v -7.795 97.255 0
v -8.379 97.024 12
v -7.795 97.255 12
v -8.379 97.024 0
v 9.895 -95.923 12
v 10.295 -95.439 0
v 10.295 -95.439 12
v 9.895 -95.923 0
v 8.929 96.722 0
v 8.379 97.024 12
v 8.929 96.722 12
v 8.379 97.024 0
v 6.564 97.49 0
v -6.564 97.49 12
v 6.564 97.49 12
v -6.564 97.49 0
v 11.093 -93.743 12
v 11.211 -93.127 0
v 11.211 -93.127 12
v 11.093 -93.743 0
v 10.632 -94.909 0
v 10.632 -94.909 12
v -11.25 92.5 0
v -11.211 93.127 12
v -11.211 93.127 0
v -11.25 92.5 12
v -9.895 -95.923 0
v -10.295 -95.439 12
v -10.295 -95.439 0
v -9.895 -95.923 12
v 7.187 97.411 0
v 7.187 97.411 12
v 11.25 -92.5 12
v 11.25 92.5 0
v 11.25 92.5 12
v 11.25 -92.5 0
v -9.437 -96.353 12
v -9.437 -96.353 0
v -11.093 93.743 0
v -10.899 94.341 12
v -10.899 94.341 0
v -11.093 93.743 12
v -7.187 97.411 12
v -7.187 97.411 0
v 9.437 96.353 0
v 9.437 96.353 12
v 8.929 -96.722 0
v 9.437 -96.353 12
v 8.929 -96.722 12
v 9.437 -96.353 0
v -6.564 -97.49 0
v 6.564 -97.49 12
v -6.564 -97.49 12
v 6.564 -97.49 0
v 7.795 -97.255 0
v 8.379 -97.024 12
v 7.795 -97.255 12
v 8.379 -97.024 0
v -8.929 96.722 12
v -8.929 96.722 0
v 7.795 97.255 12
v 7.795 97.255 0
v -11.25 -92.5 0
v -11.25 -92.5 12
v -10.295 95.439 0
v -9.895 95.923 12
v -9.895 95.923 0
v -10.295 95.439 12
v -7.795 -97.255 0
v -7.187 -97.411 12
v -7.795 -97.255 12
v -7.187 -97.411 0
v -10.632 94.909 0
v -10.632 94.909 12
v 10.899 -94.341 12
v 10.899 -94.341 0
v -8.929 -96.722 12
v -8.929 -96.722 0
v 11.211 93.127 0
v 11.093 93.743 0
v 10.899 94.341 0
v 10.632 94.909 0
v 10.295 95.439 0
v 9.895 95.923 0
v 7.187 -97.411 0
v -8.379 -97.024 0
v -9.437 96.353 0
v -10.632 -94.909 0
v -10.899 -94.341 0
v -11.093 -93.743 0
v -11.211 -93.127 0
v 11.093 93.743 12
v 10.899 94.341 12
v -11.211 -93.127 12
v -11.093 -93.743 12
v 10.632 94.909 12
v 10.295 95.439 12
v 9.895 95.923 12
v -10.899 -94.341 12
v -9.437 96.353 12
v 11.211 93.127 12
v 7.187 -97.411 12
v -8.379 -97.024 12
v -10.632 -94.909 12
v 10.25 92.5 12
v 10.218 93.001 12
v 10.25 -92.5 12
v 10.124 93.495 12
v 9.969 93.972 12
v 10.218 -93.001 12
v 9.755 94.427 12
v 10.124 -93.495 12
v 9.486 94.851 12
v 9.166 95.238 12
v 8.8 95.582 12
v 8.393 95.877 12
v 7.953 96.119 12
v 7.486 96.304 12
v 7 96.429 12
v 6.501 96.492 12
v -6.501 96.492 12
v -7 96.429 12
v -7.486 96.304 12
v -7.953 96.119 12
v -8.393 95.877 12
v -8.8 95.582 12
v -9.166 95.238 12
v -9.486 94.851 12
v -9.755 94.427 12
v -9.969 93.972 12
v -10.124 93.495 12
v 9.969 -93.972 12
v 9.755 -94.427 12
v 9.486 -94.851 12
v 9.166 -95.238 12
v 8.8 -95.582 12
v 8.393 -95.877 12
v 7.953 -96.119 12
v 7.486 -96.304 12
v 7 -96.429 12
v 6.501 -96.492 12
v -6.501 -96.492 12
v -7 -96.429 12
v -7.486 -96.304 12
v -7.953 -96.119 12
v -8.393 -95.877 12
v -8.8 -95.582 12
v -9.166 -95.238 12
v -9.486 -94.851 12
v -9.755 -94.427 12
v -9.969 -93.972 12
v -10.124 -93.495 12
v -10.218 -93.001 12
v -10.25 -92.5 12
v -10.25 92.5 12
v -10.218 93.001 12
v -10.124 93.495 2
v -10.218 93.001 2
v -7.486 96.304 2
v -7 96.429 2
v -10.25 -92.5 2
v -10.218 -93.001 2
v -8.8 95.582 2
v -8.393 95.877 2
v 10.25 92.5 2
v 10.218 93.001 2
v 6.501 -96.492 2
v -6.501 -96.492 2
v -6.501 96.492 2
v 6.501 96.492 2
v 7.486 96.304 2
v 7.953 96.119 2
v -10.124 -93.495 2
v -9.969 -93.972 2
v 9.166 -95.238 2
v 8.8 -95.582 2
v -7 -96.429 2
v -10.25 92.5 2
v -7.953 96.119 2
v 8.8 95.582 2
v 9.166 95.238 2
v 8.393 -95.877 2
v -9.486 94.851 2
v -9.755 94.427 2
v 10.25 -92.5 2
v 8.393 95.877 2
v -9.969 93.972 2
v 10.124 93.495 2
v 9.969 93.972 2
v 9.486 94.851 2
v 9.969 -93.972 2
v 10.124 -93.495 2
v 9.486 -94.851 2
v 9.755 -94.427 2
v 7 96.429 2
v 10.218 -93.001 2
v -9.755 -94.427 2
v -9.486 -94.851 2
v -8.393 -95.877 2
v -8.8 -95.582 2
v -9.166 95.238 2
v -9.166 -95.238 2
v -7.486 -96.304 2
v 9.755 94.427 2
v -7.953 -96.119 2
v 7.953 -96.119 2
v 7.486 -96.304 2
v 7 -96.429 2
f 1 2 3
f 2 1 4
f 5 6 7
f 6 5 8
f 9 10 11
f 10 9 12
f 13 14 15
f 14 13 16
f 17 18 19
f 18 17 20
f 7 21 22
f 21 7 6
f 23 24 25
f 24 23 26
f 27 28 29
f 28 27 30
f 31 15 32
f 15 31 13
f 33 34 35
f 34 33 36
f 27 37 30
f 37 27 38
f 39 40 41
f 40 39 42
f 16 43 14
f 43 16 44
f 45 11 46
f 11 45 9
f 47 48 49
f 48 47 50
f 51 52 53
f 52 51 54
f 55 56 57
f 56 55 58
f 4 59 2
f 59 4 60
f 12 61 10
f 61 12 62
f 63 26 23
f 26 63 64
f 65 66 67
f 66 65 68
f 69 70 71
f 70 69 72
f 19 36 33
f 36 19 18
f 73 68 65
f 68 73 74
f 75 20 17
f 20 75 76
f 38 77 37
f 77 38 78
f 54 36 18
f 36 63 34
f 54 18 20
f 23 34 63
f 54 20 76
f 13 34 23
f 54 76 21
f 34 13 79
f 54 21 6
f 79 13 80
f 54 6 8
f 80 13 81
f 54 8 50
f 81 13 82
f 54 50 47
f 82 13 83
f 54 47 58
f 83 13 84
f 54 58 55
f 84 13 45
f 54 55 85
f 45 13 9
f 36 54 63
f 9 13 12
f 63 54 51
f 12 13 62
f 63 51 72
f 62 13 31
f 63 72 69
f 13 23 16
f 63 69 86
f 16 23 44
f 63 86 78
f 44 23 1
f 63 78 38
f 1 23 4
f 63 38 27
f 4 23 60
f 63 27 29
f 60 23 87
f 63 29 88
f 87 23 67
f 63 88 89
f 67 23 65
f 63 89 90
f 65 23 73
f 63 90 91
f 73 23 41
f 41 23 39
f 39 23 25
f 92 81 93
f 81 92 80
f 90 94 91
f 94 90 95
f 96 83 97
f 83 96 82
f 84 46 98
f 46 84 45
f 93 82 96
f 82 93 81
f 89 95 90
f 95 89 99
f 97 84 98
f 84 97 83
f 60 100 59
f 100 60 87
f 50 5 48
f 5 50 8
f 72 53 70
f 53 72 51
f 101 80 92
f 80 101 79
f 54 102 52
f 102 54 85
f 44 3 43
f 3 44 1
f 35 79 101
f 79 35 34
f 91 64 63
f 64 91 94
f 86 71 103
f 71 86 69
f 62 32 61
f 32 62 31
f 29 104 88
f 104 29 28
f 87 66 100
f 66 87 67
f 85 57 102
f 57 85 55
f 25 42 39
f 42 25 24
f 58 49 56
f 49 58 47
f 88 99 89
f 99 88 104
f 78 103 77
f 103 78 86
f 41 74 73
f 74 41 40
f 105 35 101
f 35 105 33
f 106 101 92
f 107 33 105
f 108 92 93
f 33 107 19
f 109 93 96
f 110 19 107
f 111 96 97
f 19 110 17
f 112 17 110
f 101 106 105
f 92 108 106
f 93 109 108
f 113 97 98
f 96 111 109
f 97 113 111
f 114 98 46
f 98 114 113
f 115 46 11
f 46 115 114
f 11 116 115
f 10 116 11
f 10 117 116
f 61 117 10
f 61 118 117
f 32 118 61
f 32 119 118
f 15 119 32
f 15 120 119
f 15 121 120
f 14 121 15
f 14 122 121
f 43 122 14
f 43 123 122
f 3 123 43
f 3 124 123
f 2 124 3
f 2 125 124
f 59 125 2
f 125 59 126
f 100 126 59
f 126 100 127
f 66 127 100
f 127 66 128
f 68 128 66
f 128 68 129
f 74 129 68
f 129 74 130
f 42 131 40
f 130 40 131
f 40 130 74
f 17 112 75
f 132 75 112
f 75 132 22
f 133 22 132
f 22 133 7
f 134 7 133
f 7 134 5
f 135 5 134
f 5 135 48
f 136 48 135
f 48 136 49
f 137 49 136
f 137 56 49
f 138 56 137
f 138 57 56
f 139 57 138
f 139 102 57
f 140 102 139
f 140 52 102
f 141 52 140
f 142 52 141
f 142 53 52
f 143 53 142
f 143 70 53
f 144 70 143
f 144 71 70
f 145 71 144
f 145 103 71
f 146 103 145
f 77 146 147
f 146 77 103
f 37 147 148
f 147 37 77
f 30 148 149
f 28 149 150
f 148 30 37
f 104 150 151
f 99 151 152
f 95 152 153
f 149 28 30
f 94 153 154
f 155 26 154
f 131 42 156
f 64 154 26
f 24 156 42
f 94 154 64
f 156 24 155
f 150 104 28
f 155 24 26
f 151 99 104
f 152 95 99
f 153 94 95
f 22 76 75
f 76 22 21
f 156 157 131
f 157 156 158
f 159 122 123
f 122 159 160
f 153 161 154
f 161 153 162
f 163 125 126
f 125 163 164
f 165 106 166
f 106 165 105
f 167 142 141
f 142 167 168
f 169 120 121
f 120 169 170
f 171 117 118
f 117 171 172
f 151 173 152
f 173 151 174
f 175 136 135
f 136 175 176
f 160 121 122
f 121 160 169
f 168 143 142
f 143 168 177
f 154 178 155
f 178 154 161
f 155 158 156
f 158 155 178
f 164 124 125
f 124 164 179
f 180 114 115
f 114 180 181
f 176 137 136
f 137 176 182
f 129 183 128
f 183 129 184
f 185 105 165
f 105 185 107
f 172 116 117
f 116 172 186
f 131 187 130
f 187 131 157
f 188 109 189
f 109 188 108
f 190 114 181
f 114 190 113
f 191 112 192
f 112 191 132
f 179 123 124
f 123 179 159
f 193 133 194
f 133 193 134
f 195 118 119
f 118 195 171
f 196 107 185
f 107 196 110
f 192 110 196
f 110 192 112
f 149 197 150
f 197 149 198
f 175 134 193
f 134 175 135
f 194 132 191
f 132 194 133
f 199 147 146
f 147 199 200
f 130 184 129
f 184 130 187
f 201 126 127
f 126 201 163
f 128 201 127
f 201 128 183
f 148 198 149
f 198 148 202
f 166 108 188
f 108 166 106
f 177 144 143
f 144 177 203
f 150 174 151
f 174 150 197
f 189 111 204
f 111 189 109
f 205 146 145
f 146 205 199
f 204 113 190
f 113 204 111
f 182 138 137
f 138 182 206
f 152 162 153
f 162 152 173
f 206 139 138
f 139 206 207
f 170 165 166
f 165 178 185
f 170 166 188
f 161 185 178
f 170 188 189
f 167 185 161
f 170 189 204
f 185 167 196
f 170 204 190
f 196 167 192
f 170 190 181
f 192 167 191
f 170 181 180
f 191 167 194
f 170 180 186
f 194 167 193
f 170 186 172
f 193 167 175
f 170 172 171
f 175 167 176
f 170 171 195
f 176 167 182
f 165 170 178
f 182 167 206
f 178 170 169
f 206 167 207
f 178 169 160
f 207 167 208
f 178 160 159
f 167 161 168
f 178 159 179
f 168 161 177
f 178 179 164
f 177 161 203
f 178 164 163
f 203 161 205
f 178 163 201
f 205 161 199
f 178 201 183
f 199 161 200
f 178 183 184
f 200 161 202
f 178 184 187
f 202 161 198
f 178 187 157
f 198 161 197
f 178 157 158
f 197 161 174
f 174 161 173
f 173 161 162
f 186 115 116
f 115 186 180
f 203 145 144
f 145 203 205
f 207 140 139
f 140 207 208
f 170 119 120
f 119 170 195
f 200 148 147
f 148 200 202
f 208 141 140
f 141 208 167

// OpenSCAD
$fn = 50;


difference() {
	union() {
		hull() {
			translate(v = [-6.2500000000, 92.5000000000, 0]) {
				cylinder(h = 12, r = 5);
			}
			translate(v = [6.2500000000, 92.5000000000, 0]) {
				cylinder(h = 12, r = 5);
			}
			translate(v = [-6.2500000000, -92.5000000000, 0]) {
				cylinder(h = 12, r = 5);
			}
			translate(v = [6.2500000000, -92.5000000000, 0]) {
				cylinder(h = 12, r = 5);
			}
		}
	}
	union() {
		translate(v = [0, 0, 2]) {
			hull() {
				translate(v = [-6.2500000000, 92.5000000000, 0]) {
					cylinder(h = 10, r = 4);
				}
				translate(v = [6.2500000000, 92.5000000000, 0]) {
					cylinder(h = 10, r = 4);
				}
				translate(v = [-6.2500000000, -92.5000000000, 0]) {
					cylinder(h = 10, r = 4);
				}
				translate(v = [6.2500000000, -92.5000000000, 0]) {
					cylinder(h = 10, r = 4);
				}
			}
		}
	}
}
